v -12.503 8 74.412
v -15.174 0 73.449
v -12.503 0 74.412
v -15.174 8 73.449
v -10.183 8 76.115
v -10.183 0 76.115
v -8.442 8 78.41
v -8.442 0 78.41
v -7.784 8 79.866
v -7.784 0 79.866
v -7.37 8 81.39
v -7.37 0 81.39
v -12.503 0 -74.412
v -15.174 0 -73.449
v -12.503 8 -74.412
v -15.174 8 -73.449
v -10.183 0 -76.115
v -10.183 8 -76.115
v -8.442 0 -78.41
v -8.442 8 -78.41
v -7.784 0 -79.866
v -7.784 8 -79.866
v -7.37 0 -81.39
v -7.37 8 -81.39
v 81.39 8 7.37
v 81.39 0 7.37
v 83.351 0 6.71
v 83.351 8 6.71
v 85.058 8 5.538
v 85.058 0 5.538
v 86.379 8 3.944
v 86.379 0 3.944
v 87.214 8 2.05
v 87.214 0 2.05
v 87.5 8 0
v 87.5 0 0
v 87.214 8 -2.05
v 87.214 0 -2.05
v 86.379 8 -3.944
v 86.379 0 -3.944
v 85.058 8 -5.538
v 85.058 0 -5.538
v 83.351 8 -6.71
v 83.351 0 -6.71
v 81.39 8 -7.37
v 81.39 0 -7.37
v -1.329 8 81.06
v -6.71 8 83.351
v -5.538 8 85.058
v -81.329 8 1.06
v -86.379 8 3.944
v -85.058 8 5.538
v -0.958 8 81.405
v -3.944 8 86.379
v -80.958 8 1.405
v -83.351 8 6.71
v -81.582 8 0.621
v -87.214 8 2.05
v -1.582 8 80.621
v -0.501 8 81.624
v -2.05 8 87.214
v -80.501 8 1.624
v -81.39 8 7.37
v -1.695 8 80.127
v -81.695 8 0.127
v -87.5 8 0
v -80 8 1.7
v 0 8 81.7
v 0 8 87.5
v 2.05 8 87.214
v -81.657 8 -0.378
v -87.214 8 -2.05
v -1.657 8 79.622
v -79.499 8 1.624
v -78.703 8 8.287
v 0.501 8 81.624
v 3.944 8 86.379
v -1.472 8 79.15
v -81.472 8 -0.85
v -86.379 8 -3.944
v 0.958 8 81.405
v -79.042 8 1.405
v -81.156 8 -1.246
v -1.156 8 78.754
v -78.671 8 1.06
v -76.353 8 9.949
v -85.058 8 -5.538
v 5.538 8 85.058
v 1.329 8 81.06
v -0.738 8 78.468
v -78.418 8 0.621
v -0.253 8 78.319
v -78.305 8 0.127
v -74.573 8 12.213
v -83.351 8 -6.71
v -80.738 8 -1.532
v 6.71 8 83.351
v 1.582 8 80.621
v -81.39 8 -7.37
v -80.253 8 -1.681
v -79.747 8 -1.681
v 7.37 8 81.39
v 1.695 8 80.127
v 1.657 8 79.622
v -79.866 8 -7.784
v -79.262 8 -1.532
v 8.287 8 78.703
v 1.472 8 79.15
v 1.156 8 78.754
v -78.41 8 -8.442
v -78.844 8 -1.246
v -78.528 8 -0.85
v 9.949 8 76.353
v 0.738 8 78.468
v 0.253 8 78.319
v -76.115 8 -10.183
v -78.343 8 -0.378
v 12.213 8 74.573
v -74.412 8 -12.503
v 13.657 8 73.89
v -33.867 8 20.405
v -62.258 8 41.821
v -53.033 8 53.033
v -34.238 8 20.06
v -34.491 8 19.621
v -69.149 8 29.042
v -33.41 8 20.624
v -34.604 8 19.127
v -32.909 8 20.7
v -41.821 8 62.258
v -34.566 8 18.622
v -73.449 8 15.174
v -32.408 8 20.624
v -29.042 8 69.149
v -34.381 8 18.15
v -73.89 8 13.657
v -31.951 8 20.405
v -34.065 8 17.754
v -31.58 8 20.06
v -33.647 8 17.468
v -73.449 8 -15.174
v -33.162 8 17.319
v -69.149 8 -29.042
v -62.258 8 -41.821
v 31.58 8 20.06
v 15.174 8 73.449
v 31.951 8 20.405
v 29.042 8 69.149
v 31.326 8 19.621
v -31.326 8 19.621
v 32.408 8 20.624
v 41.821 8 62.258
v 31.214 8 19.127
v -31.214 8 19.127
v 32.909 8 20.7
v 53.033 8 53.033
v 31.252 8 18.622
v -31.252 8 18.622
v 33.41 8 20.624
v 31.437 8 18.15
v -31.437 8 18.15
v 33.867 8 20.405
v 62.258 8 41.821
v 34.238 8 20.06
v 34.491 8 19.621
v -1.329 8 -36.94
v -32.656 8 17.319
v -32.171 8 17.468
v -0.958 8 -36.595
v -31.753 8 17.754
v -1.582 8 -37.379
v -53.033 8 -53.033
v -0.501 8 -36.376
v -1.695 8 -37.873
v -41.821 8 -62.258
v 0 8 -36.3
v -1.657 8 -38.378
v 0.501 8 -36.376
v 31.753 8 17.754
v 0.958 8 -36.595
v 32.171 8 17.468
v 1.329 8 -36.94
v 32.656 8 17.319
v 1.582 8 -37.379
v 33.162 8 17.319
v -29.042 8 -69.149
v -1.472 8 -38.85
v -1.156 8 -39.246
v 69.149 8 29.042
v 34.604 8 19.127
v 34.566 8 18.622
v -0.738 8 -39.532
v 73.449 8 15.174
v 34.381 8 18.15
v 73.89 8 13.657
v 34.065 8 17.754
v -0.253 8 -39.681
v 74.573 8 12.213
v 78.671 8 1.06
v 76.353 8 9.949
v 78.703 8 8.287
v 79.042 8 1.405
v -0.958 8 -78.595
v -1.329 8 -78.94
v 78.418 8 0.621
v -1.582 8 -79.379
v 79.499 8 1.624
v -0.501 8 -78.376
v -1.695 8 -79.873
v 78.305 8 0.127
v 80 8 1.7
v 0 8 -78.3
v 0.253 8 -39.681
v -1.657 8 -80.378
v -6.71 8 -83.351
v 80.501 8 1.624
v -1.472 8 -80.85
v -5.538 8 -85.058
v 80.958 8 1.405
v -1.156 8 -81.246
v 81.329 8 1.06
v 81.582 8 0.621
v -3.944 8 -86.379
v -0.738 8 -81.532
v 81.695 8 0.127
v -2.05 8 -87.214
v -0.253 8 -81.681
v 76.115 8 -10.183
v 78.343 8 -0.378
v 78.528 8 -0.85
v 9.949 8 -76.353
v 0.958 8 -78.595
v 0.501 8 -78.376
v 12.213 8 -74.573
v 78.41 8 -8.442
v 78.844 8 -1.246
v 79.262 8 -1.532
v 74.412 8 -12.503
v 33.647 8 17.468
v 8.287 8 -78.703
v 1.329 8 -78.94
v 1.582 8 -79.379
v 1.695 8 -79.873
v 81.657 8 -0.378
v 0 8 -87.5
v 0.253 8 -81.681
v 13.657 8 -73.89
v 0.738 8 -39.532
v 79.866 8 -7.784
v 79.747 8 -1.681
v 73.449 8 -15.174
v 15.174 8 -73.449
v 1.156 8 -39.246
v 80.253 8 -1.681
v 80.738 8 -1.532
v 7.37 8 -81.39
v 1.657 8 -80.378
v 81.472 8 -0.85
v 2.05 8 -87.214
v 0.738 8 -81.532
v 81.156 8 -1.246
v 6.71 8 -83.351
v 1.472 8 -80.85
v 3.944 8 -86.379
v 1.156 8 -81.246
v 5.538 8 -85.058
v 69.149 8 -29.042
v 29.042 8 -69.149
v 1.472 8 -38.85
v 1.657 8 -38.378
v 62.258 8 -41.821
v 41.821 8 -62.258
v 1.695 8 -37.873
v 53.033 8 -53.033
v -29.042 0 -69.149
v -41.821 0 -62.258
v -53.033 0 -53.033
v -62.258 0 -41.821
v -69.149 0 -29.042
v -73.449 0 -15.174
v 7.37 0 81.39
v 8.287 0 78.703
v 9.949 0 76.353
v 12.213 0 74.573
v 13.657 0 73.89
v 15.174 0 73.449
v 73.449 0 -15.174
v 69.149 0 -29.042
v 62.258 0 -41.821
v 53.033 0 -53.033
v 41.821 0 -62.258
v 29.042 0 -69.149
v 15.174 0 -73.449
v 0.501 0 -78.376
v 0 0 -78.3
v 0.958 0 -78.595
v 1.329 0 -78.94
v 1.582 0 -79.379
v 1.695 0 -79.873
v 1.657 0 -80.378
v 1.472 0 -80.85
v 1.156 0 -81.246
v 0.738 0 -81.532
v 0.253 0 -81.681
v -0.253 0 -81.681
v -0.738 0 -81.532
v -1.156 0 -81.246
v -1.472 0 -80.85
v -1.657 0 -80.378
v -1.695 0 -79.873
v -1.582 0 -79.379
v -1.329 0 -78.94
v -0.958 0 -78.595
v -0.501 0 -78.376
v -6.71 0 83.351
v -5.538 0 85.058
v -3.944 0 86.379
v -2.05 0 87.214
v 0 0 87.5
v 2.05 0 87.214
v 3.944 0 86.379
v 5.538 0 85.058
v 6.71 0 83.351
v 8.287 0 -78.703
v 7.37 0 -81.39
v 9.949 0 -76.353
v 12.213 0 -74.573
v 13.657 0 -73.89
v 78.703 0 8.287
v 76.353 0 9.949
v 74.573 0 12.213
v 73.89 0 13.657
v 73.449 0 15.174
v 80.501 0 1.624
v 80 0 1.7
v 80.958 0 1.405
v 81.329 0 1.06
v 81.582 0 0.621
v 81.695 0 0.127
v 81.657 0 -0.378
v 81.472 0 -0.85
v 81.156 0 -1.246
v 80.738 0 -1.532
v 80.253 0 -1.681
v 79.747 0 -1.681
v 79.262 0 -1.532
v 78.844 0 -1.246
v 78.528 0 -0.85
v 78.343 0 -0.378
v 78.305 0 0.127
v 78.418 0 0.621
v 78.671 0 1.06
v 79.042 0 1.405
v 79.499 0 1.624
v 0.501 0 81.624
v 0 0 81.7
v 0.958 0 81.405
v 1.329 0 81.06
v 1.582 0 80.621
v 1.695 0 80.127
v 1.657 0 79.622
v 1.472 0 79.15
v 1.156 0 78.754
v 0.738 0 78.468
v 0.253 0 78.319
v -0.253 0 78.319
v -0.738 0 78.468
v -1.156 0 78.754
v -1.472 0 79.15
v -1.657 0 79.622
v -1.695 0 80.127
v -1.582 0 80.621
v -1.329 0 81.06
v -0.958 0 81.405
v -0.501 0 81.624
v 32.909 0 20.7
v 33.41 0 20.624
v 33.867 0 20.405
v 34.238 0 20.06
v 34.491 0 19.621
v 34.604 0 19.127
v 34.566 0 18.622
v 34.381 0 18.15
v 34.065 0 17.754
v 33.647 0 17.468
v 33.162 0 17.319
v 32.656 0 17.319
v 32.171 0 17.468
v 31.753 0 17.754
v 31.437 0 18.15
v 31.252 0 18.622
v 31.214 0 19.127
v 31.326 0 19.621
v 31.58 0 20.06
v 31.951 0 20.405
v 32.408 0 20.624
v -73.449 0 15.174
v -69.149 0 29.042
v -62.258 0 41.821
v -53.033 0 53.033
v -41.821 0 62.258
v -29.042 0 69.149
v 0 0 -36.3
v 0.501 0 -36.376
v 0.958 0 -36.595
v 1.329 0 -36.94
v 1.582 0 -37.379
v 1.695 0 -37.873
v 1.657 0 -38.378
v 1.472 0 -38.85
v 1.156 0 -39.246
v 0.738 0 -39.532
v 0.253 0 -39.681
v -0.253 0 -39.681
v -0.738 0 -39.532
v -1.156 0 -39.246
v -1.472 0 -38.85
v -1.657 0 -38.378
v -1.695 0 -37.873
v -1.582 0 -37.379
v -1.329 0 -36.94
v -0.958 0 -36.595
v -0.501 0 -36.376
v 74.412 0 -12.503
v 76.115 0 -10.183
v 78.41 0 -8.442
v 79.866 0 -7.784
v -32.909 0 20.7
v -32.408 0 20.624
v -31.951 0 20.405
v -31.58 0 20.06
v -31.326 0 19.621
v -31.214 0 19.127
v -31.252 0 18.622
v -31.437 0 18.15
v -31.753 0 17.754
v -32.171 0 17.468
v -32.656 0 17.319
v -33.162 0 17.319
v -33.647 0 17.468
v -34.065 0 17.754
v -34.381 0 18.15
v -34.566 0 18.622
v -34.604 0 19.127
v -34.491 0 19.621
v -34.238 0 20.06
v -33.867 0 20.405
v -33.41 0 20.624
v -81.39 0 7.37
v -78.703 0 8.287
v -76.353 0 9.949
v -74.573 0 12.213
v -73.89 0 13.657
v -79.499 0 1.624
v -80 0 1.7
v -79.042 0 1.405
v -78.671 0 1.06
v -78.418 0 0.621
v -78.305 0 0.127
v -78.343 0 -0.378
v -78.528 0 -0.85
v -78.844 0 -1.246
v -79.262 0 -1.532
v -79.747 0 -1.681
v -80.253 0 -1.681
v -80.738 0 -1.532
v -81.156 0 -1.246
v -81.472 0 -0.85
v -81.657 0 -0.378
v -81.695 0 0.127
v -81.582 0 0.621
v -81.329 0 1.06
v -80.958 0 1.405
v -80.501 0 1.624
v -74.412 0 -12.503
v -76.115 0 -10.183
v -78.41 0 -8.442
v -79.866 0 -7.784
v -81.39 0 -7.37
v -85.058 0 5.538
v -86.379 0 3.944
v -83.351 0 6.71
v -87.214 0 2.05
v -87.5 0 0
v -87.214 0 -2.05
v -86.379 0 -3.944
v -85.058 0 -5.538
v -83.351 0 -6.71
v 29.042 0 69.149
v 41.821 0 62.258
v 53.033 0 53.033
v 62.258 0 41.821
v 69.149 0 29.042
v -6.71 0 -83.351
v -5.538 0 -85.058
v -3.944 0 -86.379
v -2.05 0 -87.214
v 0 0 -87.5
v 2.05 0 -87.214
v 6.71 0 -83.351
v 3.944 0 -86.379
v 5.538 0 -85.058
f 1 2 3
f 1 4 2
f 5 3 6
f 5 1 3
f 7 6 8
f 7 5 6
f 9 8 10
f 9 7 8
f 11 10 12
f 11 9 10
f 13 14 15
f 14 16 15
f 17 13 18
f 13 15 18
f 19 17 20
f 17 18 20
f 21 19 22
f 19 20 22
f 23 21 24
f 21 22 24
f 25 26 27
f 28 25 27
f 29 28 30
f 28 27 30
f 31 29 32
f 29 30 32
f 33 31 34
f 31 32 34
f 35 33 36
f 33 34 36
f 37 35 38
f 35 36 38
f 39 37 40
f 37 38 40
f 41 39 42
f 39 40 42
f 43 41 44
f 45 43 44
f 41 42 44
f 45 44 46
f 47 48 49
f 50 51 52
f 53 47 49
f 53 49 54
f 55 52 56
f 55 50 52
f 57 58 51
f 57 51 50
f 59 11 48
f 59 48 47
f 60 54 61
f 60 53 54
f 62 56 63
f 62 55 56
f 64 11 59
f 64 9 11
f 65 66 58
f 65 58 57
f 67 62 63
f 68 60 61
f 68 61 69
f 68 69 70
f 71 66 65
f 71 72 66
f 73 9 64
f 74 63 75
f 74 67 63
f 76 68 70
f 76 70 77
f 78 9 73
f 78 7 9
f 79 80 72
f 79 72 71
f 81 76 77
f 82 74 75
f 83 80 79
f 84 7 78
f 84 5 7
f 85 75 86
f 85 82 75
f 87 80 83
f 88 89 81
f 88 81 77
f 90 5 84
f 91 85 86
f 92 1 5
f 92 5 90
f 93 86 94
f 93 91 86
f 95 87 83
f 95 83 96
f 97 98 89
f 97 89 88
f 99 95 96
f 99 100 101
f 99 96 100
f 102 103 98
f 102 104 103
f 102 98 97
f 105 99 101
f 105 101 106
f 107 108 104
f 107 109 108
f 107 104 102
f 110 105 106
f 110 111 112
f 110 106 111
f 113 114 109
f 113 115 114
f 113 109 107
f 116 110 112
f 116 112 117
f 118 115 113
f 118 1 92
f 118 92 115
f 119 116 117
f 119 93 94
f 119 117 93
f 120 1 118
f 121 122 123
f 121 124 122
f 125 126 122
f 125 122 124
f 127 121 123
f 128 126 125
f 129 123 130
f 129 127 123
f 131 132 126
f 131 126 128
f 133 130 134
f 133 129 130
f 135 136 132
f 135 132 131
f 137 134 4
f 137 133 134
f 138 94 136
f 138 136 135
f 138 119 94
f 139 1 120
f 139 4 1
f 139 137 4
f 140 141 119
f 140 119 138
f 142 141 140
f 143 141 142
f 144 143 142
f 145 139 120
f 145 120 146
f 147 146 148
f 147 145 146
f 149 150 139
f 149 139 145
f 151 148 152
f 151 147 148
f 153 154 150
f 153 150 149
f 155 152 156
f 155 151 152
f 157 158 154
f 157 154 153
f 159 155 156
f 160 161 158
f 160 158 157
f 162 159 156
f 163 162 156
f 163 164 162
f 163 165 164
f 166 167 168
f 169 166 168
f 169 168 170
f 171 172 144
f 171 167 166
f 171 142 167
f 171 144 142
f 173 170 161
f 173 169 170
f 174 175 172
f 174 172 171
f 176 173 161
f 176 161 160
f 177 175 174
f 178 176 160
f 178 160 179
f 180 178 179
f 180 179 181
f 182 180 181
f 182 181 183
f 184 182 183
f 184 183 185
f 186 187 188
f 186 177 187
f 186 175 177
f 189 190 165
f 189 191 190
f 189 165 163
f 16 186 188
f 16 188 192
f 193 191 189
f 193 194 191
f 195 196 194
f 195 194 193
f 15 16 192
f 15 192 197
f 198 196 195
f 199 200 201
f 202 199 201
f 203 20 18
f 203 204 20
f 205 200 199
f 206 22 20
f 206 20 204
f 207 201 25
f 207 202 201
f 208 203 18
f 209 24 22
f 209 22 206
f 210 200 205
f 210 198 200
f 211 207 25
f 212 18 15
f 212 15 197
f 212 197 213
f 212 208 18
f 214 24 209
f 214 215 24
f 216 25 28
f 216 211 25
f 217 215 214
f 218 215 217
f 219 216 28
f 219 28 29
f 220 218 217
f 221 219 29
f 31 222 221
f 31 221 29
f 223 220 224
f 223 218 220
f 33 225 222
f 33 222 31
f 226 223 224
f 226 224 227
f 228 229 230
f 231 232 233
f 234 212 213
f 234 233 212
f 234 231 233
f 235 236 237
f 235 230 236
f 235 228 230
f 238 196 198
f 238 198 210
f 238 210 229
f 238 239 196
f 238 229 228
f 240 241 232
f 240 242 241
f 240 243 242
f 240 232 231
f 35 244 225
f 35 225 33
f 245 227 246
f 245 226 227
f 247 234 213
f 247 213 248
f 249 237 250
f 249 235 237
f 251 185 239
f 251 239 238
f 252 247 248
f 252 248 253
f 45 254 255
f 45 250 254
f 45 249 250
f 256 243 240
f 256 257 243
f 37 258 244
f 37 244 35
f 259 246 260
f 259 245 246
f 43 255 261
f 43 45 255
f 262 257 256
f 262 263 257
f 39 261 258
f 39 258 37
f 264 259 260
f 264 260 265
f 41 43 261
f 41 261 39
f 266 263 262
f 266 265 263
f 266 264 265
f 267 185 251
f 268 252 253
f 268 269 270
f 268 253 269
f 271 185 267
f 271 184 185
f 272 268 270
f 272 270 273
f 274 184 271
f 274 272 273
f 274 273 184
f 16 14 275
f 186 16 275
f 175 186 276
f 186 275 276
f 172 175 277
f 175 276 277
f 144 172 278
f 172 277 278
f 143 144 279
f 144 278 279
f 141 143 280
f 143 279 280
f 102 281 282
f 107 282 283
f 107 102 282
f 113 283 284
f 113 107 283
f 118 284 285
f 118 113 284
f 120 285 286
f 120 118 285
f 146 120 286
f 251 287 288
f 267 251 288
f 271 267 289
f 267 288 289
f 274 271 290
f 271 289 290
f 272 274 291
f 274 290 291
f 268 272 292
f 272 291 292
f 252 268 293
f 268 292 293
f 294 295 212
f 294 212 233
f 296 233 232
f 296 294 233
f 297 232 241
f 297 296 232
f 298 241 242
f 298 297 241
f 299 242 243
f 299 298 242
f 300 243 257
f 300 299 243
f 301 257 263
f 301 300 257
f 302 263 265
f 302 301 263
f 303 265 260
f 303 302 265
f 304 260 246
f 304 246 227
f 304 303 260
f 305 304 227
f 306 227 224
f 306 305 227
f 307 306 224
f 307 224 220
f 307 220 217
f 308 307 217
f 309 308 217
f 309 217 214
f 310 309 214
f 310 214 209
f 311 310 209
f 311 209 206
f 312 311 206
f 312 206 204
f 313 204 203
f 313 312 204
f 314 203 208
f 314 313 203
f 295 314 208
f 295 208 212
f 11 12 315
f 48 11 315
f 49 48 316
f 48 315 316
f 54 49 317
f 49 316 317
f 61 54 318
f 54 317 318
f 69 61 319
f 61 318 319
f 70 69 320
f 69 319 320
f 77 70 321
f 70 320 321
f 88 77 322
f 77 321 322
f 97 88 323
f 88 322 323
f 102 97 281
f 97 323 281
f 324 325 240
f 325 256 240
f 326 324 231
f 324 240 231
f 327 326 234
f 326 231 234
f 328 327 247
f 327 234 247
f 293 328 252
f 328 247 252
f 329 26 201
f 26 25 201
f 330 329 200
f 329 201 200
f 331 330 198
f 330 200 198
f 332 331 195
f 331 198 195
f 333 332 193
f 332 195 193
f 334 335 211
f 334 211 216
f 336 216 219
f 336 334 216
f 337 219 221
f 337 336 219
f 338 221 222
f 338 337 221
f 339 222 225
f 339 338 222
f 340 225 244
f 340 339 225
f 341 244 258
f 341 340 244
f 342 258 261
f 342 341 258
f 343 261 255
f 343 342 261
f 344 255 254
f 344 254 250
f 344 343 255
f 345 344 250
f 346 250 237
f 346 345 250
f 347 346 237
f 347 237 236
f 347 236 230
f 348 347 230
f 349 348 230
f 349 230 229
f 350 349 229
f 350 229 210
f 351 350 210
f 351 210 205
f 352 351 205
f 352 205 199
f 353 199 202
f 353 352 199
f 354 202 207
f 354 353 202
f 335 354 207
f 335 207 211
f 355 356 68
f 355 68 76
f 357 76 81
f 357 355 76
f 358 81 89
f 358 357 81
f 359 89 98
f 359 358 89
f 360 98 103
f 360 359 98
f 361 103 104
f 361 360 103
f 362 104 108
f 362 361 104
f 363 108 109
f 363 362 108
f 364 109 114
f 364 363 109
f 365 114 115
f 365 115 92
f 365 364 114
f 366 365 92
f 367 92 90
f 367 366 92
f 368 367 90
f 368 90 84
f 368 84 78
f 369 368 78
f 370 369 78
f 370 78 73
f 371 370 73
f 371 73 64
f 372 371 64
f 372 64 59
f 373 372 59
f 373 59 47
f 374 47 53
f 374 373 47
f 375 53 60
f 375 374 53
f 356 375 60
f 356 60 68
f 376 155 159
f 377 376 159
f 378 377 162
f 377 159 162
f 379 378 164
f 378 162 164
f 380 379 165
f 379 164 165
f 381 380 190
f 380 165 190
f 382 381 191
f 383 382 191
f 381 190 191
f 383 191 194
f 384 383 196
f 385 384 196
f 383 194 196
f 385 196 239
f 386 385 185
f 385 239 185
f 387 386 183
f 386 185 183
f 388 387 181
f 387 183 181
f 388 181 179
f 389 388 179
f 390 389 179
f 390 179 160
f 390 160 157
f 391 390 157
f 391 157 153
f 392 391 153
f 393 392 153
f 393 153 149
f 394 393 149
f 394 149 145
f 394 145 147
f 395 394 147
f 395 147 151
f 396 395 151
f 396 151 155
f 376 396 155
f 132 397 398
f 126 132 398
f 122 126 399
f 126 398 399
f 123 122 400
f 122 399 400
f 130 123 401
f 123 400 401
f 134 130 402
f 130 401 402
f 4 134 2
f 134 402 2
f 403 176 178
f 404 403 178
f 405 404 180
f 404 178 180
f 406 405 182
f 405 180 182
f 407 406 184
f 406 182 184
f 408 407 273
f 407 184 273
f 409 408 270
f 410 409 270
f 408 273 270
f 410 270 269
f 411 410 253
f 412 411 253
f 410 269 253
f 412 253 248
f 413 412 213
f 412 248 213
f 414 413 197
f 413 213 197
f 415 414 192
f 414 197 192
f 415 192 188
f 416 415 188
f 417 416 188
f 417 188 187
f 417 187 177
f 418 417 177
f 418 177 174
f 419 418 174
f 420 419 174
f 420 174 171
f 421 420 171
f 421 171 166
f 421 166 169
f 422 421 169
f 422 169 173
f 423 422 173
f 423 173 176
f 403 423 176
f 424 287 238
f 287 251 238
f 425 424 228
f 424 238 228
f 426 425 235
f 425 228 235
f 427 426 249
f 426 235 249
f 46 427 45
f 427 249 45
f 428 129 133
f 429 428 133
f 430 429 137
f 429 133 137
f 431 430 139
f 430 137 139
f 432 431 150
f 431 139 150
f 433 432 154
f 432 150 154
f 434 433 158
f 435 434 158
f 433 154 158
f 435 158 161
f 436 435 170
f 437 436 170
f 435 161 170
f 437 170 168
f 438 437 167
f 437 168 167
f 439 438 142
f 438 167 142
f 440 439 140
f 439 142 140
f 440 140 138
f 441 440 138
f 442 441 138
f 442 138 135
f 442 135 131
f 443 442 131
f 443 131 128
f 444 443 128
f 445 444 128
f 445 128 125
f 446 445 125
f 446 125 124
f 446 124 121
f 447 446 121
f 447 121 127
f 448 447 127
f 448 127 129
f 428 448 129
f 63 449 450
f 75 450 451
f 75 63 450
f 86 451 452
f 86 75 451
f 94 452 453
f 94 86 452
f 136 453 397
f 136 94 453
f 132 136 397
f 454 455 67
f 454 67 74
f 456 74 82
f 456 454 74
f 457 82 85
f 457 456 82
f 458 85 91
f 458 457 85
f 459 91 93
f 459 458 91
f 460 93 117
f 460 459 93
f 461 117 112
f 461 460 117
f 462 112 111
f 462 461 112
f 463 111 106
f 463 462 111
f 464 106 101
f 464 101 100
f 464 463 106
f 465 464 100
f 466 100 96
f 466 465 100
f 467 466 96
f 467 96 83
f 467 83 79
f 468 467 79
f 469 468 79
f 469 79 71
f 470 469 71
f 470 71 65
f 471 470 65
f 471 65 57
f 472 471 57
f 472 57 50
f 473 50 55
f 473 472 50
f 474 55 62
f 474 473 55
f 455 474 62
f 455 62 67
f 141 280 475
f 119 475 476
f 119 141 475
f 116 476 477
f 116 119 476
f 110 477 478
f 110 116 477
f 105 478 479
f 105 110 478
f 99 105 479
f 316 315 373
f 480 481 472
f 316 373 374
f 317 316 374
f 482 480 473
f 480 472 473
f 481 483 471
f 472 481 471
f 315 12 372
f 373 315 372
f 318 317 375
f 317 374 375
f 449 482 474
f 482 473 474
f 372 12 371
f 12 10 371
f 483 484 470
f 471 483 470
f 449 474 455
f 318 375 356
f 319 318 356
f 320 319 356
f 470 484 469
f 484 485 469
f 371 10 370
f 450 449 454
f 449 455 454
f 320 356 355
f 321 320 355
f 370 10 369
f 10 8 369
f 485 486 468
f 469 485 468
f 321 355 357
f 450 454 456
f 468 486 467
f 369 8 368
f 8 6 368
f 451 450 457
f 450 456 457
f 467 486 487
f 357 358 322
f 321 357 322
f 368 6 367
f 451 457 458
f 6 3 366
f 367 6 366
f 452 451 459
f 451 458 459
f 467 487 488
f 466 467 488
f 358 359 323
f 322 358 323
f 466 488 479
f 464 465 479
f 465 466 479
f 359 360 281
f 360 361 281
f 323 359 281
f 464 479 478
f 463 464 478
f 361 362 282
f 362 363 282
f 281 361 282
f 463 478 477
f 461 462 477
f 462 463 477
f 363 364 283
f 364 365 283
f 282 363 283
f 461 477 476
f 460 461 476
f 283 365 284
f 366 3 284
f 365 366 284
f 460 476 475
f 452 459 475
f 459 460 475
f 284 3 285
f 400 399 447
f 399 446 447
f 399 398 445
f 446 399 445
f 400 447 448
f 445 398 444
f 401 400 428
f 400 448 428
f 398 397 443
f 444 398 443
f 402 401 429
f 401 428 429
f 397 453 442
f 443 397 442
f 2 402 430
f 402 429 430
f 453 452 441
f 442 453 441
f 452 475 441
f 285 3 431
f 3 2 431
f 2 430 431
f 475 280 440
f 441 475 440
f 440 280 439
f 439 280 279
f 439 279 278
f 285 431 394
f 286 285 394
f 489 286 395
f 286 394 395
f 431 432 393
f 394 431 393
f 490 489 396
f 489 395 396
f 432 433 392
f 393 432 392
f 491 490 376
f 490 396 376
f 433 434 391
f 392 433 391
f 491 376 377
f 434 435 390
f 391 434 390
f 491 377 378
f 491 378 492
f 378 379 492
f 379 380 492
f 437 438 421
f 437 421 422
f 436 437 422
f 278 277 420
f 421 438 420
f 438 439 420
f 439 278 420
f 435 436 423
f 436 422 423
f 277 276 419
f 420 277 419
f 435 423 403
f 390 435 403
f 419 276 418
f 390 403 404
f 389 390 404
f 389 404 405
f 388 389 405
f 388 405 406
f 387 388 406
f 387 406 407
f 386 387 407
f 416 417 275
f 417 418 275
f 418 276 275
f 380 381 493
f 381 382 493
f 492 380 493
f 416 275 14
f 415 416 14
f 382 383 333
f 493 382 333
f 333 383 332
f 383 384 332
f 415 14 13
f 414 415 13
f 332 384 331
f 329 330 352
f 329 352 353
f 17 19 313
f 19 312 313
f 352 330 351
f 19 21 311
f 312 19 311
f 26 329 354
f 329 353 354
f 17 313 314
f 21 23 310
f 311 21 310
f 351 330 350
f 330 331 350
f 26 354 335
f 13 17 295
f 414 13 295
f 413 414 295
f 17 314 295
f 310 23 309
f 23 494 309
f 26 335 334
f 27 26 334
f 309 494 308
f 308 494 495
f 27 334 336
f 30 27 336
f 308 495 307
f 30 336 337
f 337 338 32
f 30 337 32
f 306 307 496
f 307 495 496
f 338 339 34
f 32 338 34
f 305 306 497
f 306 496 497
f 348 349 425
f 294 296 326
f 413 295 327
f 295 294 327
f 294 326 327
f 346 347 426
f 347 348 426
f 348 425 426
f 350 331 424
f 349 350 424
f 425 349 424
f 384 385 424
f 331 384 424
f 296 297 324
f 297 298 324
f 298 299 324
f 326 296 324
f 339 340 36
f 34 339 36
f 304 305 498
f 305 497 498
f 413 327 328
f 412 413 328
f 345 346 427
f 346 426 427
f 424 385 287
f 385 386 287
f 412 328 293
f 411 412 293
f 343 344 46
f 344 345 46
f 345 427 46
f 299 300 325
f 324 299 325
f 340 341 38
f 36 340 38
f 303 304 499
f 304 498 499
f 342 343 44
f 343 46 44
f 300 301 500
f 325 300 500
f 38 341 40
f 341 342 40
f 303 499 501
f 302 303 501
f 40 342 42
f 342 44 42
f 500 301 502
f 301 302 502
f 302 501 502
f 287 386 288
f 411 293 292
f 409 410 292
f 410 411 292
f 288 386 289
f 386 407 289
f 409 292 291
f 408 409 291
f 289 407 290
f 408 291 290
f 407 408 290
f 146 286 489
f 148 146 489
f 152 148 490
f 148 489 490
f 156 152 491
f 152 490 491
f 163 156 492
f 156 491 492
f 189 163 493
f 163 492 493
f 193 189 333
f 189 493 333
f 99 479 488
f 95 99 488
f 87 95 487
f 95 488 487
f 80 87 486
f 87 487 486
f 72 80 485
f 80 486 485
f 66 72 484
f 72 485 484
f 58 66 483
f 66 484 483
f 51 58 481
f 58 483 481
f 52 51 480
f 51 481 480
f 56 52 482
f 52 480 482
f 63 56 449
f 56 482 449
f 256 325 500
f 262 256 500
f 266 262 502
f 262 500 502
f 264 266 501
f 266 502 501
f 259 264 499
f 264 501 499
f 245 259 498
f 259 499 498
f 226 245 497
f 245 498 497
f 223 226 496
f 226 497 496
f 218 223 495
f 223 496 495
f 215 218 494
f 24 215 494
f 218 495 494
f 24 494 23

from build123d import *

# Parameters (mm, degrees)
SKETCH1_R           = 1.7
BOSS_EXTRUDE1_DEPTH = 8
FILLET1_R           = 10
SKETCH2_R           = 1.7
CUT_EXTRUDE1_DEPTH  = 39


with BuildPart() as part:
    # Sketch1 → Boss-Extrude1 (new body)
    with BuildSketch(Plane(origin=(0, 0, 0), x_dir=(1, 0, 0), z_dir=(0, 1, 0))):
        with BuildLine():
            ThreePointArc((-5.409133759, 74.8046875), (-53.033008589, 53.033008589), (-74.8046875, 5.409133759))
            ThreePointArc((-74.8046875, 5.409133759), (-87.5, 0), (-74.8046875, -5.409133759))
            ThreePointArc((-74.8046875, -5.409133759), (-53.033008589, -53.033008589), (-5.409133759, -74.8046875))
            ThreePointArc((-5.409133759, -74.8046875), (0, -87.5), (5.409133759, -74.8046875))
            ThreePointArc((5.409133759, -74.8046875), (53.033008589, -53.033008589), (74.8046875, -5.409133759))
            ThreePointArc((74.8046875, -5.409133759), (87.5, 0), (74.8046875, 5.409133759))
            ThreePointArc((74.8046875, 5.409133759), (53.033008589, 53.033008589), (5.409133759, 74.8046875))
            ThreePointArc((5.409133759, 74.8046875), (0, 87.5), (-5.409133759, 74.8046875))
        make_face()
        with Locations(Location((-80, 0, 0), (0, 0, 270))):
            Circle(SKETCH1_R, mode=Mode.SUBTRACT)
        with Locations(Location((80, 0, 0), (0, 0, 270))):
            Circle(SKETCH1_R, mode=Mode.SUBTRACT)
        with Locations(Location((0, 80, 0), (0, 0, 270))):
            Circle(SKETCH1_R, mode=Mode.SUBTRACT)
        with Locations(Location((0, -80, 0), (0, 0, 270))):
            Circle(SKETCH1_R, mode=Mode.SUBTRACT)
    extrude(amount=BOSS_EXTRUDE1_DEPTH)

    # Fillet1
    fillet1_edges = [part.edges().sort_by_distance(p)[0] for p in [
        (74.8046875, 4, -5.409133759),
        (74.8046875, 4, 5.409133759),
        (5.409133759, 4, 74.8046875),
        (-5.409133759, 4, 74.8046875),
        (-74.8046875, 4, 5.409133759),
        (-74.8046875, 4, -5.409133759),
        (-5.409133759, 4, -74.8046875),
        (5.409133759, 4, -74.8046875),
    ]]
    fillet(fillet1_edges, radius=FILLET1_R)

    # Sketch2 → Cut-Extrude1 (cut)
    with BuildSketch(Plane(origin=(0, 8, 0), x_dir=(1, 0, 0), z_dir=(0, 1, 0))):
        with Locations(Location((0, 38, 0), (0, 0, 270))):
            Circle(SKETCH2_R)
        with Locations(Location((32.908965344, -19, 0), (0, 0, 270))):
            Circle(SKETCH2_R)
        with Locations(Location((-32.908965344, -19, 0), (0, 0, 270))):
            Circle(SKETCH2_R)
    extrude(amount=-CUT_EXTRUDE1_DEPTH, mode=Mode.SUBTRACT)


solid = part.part
